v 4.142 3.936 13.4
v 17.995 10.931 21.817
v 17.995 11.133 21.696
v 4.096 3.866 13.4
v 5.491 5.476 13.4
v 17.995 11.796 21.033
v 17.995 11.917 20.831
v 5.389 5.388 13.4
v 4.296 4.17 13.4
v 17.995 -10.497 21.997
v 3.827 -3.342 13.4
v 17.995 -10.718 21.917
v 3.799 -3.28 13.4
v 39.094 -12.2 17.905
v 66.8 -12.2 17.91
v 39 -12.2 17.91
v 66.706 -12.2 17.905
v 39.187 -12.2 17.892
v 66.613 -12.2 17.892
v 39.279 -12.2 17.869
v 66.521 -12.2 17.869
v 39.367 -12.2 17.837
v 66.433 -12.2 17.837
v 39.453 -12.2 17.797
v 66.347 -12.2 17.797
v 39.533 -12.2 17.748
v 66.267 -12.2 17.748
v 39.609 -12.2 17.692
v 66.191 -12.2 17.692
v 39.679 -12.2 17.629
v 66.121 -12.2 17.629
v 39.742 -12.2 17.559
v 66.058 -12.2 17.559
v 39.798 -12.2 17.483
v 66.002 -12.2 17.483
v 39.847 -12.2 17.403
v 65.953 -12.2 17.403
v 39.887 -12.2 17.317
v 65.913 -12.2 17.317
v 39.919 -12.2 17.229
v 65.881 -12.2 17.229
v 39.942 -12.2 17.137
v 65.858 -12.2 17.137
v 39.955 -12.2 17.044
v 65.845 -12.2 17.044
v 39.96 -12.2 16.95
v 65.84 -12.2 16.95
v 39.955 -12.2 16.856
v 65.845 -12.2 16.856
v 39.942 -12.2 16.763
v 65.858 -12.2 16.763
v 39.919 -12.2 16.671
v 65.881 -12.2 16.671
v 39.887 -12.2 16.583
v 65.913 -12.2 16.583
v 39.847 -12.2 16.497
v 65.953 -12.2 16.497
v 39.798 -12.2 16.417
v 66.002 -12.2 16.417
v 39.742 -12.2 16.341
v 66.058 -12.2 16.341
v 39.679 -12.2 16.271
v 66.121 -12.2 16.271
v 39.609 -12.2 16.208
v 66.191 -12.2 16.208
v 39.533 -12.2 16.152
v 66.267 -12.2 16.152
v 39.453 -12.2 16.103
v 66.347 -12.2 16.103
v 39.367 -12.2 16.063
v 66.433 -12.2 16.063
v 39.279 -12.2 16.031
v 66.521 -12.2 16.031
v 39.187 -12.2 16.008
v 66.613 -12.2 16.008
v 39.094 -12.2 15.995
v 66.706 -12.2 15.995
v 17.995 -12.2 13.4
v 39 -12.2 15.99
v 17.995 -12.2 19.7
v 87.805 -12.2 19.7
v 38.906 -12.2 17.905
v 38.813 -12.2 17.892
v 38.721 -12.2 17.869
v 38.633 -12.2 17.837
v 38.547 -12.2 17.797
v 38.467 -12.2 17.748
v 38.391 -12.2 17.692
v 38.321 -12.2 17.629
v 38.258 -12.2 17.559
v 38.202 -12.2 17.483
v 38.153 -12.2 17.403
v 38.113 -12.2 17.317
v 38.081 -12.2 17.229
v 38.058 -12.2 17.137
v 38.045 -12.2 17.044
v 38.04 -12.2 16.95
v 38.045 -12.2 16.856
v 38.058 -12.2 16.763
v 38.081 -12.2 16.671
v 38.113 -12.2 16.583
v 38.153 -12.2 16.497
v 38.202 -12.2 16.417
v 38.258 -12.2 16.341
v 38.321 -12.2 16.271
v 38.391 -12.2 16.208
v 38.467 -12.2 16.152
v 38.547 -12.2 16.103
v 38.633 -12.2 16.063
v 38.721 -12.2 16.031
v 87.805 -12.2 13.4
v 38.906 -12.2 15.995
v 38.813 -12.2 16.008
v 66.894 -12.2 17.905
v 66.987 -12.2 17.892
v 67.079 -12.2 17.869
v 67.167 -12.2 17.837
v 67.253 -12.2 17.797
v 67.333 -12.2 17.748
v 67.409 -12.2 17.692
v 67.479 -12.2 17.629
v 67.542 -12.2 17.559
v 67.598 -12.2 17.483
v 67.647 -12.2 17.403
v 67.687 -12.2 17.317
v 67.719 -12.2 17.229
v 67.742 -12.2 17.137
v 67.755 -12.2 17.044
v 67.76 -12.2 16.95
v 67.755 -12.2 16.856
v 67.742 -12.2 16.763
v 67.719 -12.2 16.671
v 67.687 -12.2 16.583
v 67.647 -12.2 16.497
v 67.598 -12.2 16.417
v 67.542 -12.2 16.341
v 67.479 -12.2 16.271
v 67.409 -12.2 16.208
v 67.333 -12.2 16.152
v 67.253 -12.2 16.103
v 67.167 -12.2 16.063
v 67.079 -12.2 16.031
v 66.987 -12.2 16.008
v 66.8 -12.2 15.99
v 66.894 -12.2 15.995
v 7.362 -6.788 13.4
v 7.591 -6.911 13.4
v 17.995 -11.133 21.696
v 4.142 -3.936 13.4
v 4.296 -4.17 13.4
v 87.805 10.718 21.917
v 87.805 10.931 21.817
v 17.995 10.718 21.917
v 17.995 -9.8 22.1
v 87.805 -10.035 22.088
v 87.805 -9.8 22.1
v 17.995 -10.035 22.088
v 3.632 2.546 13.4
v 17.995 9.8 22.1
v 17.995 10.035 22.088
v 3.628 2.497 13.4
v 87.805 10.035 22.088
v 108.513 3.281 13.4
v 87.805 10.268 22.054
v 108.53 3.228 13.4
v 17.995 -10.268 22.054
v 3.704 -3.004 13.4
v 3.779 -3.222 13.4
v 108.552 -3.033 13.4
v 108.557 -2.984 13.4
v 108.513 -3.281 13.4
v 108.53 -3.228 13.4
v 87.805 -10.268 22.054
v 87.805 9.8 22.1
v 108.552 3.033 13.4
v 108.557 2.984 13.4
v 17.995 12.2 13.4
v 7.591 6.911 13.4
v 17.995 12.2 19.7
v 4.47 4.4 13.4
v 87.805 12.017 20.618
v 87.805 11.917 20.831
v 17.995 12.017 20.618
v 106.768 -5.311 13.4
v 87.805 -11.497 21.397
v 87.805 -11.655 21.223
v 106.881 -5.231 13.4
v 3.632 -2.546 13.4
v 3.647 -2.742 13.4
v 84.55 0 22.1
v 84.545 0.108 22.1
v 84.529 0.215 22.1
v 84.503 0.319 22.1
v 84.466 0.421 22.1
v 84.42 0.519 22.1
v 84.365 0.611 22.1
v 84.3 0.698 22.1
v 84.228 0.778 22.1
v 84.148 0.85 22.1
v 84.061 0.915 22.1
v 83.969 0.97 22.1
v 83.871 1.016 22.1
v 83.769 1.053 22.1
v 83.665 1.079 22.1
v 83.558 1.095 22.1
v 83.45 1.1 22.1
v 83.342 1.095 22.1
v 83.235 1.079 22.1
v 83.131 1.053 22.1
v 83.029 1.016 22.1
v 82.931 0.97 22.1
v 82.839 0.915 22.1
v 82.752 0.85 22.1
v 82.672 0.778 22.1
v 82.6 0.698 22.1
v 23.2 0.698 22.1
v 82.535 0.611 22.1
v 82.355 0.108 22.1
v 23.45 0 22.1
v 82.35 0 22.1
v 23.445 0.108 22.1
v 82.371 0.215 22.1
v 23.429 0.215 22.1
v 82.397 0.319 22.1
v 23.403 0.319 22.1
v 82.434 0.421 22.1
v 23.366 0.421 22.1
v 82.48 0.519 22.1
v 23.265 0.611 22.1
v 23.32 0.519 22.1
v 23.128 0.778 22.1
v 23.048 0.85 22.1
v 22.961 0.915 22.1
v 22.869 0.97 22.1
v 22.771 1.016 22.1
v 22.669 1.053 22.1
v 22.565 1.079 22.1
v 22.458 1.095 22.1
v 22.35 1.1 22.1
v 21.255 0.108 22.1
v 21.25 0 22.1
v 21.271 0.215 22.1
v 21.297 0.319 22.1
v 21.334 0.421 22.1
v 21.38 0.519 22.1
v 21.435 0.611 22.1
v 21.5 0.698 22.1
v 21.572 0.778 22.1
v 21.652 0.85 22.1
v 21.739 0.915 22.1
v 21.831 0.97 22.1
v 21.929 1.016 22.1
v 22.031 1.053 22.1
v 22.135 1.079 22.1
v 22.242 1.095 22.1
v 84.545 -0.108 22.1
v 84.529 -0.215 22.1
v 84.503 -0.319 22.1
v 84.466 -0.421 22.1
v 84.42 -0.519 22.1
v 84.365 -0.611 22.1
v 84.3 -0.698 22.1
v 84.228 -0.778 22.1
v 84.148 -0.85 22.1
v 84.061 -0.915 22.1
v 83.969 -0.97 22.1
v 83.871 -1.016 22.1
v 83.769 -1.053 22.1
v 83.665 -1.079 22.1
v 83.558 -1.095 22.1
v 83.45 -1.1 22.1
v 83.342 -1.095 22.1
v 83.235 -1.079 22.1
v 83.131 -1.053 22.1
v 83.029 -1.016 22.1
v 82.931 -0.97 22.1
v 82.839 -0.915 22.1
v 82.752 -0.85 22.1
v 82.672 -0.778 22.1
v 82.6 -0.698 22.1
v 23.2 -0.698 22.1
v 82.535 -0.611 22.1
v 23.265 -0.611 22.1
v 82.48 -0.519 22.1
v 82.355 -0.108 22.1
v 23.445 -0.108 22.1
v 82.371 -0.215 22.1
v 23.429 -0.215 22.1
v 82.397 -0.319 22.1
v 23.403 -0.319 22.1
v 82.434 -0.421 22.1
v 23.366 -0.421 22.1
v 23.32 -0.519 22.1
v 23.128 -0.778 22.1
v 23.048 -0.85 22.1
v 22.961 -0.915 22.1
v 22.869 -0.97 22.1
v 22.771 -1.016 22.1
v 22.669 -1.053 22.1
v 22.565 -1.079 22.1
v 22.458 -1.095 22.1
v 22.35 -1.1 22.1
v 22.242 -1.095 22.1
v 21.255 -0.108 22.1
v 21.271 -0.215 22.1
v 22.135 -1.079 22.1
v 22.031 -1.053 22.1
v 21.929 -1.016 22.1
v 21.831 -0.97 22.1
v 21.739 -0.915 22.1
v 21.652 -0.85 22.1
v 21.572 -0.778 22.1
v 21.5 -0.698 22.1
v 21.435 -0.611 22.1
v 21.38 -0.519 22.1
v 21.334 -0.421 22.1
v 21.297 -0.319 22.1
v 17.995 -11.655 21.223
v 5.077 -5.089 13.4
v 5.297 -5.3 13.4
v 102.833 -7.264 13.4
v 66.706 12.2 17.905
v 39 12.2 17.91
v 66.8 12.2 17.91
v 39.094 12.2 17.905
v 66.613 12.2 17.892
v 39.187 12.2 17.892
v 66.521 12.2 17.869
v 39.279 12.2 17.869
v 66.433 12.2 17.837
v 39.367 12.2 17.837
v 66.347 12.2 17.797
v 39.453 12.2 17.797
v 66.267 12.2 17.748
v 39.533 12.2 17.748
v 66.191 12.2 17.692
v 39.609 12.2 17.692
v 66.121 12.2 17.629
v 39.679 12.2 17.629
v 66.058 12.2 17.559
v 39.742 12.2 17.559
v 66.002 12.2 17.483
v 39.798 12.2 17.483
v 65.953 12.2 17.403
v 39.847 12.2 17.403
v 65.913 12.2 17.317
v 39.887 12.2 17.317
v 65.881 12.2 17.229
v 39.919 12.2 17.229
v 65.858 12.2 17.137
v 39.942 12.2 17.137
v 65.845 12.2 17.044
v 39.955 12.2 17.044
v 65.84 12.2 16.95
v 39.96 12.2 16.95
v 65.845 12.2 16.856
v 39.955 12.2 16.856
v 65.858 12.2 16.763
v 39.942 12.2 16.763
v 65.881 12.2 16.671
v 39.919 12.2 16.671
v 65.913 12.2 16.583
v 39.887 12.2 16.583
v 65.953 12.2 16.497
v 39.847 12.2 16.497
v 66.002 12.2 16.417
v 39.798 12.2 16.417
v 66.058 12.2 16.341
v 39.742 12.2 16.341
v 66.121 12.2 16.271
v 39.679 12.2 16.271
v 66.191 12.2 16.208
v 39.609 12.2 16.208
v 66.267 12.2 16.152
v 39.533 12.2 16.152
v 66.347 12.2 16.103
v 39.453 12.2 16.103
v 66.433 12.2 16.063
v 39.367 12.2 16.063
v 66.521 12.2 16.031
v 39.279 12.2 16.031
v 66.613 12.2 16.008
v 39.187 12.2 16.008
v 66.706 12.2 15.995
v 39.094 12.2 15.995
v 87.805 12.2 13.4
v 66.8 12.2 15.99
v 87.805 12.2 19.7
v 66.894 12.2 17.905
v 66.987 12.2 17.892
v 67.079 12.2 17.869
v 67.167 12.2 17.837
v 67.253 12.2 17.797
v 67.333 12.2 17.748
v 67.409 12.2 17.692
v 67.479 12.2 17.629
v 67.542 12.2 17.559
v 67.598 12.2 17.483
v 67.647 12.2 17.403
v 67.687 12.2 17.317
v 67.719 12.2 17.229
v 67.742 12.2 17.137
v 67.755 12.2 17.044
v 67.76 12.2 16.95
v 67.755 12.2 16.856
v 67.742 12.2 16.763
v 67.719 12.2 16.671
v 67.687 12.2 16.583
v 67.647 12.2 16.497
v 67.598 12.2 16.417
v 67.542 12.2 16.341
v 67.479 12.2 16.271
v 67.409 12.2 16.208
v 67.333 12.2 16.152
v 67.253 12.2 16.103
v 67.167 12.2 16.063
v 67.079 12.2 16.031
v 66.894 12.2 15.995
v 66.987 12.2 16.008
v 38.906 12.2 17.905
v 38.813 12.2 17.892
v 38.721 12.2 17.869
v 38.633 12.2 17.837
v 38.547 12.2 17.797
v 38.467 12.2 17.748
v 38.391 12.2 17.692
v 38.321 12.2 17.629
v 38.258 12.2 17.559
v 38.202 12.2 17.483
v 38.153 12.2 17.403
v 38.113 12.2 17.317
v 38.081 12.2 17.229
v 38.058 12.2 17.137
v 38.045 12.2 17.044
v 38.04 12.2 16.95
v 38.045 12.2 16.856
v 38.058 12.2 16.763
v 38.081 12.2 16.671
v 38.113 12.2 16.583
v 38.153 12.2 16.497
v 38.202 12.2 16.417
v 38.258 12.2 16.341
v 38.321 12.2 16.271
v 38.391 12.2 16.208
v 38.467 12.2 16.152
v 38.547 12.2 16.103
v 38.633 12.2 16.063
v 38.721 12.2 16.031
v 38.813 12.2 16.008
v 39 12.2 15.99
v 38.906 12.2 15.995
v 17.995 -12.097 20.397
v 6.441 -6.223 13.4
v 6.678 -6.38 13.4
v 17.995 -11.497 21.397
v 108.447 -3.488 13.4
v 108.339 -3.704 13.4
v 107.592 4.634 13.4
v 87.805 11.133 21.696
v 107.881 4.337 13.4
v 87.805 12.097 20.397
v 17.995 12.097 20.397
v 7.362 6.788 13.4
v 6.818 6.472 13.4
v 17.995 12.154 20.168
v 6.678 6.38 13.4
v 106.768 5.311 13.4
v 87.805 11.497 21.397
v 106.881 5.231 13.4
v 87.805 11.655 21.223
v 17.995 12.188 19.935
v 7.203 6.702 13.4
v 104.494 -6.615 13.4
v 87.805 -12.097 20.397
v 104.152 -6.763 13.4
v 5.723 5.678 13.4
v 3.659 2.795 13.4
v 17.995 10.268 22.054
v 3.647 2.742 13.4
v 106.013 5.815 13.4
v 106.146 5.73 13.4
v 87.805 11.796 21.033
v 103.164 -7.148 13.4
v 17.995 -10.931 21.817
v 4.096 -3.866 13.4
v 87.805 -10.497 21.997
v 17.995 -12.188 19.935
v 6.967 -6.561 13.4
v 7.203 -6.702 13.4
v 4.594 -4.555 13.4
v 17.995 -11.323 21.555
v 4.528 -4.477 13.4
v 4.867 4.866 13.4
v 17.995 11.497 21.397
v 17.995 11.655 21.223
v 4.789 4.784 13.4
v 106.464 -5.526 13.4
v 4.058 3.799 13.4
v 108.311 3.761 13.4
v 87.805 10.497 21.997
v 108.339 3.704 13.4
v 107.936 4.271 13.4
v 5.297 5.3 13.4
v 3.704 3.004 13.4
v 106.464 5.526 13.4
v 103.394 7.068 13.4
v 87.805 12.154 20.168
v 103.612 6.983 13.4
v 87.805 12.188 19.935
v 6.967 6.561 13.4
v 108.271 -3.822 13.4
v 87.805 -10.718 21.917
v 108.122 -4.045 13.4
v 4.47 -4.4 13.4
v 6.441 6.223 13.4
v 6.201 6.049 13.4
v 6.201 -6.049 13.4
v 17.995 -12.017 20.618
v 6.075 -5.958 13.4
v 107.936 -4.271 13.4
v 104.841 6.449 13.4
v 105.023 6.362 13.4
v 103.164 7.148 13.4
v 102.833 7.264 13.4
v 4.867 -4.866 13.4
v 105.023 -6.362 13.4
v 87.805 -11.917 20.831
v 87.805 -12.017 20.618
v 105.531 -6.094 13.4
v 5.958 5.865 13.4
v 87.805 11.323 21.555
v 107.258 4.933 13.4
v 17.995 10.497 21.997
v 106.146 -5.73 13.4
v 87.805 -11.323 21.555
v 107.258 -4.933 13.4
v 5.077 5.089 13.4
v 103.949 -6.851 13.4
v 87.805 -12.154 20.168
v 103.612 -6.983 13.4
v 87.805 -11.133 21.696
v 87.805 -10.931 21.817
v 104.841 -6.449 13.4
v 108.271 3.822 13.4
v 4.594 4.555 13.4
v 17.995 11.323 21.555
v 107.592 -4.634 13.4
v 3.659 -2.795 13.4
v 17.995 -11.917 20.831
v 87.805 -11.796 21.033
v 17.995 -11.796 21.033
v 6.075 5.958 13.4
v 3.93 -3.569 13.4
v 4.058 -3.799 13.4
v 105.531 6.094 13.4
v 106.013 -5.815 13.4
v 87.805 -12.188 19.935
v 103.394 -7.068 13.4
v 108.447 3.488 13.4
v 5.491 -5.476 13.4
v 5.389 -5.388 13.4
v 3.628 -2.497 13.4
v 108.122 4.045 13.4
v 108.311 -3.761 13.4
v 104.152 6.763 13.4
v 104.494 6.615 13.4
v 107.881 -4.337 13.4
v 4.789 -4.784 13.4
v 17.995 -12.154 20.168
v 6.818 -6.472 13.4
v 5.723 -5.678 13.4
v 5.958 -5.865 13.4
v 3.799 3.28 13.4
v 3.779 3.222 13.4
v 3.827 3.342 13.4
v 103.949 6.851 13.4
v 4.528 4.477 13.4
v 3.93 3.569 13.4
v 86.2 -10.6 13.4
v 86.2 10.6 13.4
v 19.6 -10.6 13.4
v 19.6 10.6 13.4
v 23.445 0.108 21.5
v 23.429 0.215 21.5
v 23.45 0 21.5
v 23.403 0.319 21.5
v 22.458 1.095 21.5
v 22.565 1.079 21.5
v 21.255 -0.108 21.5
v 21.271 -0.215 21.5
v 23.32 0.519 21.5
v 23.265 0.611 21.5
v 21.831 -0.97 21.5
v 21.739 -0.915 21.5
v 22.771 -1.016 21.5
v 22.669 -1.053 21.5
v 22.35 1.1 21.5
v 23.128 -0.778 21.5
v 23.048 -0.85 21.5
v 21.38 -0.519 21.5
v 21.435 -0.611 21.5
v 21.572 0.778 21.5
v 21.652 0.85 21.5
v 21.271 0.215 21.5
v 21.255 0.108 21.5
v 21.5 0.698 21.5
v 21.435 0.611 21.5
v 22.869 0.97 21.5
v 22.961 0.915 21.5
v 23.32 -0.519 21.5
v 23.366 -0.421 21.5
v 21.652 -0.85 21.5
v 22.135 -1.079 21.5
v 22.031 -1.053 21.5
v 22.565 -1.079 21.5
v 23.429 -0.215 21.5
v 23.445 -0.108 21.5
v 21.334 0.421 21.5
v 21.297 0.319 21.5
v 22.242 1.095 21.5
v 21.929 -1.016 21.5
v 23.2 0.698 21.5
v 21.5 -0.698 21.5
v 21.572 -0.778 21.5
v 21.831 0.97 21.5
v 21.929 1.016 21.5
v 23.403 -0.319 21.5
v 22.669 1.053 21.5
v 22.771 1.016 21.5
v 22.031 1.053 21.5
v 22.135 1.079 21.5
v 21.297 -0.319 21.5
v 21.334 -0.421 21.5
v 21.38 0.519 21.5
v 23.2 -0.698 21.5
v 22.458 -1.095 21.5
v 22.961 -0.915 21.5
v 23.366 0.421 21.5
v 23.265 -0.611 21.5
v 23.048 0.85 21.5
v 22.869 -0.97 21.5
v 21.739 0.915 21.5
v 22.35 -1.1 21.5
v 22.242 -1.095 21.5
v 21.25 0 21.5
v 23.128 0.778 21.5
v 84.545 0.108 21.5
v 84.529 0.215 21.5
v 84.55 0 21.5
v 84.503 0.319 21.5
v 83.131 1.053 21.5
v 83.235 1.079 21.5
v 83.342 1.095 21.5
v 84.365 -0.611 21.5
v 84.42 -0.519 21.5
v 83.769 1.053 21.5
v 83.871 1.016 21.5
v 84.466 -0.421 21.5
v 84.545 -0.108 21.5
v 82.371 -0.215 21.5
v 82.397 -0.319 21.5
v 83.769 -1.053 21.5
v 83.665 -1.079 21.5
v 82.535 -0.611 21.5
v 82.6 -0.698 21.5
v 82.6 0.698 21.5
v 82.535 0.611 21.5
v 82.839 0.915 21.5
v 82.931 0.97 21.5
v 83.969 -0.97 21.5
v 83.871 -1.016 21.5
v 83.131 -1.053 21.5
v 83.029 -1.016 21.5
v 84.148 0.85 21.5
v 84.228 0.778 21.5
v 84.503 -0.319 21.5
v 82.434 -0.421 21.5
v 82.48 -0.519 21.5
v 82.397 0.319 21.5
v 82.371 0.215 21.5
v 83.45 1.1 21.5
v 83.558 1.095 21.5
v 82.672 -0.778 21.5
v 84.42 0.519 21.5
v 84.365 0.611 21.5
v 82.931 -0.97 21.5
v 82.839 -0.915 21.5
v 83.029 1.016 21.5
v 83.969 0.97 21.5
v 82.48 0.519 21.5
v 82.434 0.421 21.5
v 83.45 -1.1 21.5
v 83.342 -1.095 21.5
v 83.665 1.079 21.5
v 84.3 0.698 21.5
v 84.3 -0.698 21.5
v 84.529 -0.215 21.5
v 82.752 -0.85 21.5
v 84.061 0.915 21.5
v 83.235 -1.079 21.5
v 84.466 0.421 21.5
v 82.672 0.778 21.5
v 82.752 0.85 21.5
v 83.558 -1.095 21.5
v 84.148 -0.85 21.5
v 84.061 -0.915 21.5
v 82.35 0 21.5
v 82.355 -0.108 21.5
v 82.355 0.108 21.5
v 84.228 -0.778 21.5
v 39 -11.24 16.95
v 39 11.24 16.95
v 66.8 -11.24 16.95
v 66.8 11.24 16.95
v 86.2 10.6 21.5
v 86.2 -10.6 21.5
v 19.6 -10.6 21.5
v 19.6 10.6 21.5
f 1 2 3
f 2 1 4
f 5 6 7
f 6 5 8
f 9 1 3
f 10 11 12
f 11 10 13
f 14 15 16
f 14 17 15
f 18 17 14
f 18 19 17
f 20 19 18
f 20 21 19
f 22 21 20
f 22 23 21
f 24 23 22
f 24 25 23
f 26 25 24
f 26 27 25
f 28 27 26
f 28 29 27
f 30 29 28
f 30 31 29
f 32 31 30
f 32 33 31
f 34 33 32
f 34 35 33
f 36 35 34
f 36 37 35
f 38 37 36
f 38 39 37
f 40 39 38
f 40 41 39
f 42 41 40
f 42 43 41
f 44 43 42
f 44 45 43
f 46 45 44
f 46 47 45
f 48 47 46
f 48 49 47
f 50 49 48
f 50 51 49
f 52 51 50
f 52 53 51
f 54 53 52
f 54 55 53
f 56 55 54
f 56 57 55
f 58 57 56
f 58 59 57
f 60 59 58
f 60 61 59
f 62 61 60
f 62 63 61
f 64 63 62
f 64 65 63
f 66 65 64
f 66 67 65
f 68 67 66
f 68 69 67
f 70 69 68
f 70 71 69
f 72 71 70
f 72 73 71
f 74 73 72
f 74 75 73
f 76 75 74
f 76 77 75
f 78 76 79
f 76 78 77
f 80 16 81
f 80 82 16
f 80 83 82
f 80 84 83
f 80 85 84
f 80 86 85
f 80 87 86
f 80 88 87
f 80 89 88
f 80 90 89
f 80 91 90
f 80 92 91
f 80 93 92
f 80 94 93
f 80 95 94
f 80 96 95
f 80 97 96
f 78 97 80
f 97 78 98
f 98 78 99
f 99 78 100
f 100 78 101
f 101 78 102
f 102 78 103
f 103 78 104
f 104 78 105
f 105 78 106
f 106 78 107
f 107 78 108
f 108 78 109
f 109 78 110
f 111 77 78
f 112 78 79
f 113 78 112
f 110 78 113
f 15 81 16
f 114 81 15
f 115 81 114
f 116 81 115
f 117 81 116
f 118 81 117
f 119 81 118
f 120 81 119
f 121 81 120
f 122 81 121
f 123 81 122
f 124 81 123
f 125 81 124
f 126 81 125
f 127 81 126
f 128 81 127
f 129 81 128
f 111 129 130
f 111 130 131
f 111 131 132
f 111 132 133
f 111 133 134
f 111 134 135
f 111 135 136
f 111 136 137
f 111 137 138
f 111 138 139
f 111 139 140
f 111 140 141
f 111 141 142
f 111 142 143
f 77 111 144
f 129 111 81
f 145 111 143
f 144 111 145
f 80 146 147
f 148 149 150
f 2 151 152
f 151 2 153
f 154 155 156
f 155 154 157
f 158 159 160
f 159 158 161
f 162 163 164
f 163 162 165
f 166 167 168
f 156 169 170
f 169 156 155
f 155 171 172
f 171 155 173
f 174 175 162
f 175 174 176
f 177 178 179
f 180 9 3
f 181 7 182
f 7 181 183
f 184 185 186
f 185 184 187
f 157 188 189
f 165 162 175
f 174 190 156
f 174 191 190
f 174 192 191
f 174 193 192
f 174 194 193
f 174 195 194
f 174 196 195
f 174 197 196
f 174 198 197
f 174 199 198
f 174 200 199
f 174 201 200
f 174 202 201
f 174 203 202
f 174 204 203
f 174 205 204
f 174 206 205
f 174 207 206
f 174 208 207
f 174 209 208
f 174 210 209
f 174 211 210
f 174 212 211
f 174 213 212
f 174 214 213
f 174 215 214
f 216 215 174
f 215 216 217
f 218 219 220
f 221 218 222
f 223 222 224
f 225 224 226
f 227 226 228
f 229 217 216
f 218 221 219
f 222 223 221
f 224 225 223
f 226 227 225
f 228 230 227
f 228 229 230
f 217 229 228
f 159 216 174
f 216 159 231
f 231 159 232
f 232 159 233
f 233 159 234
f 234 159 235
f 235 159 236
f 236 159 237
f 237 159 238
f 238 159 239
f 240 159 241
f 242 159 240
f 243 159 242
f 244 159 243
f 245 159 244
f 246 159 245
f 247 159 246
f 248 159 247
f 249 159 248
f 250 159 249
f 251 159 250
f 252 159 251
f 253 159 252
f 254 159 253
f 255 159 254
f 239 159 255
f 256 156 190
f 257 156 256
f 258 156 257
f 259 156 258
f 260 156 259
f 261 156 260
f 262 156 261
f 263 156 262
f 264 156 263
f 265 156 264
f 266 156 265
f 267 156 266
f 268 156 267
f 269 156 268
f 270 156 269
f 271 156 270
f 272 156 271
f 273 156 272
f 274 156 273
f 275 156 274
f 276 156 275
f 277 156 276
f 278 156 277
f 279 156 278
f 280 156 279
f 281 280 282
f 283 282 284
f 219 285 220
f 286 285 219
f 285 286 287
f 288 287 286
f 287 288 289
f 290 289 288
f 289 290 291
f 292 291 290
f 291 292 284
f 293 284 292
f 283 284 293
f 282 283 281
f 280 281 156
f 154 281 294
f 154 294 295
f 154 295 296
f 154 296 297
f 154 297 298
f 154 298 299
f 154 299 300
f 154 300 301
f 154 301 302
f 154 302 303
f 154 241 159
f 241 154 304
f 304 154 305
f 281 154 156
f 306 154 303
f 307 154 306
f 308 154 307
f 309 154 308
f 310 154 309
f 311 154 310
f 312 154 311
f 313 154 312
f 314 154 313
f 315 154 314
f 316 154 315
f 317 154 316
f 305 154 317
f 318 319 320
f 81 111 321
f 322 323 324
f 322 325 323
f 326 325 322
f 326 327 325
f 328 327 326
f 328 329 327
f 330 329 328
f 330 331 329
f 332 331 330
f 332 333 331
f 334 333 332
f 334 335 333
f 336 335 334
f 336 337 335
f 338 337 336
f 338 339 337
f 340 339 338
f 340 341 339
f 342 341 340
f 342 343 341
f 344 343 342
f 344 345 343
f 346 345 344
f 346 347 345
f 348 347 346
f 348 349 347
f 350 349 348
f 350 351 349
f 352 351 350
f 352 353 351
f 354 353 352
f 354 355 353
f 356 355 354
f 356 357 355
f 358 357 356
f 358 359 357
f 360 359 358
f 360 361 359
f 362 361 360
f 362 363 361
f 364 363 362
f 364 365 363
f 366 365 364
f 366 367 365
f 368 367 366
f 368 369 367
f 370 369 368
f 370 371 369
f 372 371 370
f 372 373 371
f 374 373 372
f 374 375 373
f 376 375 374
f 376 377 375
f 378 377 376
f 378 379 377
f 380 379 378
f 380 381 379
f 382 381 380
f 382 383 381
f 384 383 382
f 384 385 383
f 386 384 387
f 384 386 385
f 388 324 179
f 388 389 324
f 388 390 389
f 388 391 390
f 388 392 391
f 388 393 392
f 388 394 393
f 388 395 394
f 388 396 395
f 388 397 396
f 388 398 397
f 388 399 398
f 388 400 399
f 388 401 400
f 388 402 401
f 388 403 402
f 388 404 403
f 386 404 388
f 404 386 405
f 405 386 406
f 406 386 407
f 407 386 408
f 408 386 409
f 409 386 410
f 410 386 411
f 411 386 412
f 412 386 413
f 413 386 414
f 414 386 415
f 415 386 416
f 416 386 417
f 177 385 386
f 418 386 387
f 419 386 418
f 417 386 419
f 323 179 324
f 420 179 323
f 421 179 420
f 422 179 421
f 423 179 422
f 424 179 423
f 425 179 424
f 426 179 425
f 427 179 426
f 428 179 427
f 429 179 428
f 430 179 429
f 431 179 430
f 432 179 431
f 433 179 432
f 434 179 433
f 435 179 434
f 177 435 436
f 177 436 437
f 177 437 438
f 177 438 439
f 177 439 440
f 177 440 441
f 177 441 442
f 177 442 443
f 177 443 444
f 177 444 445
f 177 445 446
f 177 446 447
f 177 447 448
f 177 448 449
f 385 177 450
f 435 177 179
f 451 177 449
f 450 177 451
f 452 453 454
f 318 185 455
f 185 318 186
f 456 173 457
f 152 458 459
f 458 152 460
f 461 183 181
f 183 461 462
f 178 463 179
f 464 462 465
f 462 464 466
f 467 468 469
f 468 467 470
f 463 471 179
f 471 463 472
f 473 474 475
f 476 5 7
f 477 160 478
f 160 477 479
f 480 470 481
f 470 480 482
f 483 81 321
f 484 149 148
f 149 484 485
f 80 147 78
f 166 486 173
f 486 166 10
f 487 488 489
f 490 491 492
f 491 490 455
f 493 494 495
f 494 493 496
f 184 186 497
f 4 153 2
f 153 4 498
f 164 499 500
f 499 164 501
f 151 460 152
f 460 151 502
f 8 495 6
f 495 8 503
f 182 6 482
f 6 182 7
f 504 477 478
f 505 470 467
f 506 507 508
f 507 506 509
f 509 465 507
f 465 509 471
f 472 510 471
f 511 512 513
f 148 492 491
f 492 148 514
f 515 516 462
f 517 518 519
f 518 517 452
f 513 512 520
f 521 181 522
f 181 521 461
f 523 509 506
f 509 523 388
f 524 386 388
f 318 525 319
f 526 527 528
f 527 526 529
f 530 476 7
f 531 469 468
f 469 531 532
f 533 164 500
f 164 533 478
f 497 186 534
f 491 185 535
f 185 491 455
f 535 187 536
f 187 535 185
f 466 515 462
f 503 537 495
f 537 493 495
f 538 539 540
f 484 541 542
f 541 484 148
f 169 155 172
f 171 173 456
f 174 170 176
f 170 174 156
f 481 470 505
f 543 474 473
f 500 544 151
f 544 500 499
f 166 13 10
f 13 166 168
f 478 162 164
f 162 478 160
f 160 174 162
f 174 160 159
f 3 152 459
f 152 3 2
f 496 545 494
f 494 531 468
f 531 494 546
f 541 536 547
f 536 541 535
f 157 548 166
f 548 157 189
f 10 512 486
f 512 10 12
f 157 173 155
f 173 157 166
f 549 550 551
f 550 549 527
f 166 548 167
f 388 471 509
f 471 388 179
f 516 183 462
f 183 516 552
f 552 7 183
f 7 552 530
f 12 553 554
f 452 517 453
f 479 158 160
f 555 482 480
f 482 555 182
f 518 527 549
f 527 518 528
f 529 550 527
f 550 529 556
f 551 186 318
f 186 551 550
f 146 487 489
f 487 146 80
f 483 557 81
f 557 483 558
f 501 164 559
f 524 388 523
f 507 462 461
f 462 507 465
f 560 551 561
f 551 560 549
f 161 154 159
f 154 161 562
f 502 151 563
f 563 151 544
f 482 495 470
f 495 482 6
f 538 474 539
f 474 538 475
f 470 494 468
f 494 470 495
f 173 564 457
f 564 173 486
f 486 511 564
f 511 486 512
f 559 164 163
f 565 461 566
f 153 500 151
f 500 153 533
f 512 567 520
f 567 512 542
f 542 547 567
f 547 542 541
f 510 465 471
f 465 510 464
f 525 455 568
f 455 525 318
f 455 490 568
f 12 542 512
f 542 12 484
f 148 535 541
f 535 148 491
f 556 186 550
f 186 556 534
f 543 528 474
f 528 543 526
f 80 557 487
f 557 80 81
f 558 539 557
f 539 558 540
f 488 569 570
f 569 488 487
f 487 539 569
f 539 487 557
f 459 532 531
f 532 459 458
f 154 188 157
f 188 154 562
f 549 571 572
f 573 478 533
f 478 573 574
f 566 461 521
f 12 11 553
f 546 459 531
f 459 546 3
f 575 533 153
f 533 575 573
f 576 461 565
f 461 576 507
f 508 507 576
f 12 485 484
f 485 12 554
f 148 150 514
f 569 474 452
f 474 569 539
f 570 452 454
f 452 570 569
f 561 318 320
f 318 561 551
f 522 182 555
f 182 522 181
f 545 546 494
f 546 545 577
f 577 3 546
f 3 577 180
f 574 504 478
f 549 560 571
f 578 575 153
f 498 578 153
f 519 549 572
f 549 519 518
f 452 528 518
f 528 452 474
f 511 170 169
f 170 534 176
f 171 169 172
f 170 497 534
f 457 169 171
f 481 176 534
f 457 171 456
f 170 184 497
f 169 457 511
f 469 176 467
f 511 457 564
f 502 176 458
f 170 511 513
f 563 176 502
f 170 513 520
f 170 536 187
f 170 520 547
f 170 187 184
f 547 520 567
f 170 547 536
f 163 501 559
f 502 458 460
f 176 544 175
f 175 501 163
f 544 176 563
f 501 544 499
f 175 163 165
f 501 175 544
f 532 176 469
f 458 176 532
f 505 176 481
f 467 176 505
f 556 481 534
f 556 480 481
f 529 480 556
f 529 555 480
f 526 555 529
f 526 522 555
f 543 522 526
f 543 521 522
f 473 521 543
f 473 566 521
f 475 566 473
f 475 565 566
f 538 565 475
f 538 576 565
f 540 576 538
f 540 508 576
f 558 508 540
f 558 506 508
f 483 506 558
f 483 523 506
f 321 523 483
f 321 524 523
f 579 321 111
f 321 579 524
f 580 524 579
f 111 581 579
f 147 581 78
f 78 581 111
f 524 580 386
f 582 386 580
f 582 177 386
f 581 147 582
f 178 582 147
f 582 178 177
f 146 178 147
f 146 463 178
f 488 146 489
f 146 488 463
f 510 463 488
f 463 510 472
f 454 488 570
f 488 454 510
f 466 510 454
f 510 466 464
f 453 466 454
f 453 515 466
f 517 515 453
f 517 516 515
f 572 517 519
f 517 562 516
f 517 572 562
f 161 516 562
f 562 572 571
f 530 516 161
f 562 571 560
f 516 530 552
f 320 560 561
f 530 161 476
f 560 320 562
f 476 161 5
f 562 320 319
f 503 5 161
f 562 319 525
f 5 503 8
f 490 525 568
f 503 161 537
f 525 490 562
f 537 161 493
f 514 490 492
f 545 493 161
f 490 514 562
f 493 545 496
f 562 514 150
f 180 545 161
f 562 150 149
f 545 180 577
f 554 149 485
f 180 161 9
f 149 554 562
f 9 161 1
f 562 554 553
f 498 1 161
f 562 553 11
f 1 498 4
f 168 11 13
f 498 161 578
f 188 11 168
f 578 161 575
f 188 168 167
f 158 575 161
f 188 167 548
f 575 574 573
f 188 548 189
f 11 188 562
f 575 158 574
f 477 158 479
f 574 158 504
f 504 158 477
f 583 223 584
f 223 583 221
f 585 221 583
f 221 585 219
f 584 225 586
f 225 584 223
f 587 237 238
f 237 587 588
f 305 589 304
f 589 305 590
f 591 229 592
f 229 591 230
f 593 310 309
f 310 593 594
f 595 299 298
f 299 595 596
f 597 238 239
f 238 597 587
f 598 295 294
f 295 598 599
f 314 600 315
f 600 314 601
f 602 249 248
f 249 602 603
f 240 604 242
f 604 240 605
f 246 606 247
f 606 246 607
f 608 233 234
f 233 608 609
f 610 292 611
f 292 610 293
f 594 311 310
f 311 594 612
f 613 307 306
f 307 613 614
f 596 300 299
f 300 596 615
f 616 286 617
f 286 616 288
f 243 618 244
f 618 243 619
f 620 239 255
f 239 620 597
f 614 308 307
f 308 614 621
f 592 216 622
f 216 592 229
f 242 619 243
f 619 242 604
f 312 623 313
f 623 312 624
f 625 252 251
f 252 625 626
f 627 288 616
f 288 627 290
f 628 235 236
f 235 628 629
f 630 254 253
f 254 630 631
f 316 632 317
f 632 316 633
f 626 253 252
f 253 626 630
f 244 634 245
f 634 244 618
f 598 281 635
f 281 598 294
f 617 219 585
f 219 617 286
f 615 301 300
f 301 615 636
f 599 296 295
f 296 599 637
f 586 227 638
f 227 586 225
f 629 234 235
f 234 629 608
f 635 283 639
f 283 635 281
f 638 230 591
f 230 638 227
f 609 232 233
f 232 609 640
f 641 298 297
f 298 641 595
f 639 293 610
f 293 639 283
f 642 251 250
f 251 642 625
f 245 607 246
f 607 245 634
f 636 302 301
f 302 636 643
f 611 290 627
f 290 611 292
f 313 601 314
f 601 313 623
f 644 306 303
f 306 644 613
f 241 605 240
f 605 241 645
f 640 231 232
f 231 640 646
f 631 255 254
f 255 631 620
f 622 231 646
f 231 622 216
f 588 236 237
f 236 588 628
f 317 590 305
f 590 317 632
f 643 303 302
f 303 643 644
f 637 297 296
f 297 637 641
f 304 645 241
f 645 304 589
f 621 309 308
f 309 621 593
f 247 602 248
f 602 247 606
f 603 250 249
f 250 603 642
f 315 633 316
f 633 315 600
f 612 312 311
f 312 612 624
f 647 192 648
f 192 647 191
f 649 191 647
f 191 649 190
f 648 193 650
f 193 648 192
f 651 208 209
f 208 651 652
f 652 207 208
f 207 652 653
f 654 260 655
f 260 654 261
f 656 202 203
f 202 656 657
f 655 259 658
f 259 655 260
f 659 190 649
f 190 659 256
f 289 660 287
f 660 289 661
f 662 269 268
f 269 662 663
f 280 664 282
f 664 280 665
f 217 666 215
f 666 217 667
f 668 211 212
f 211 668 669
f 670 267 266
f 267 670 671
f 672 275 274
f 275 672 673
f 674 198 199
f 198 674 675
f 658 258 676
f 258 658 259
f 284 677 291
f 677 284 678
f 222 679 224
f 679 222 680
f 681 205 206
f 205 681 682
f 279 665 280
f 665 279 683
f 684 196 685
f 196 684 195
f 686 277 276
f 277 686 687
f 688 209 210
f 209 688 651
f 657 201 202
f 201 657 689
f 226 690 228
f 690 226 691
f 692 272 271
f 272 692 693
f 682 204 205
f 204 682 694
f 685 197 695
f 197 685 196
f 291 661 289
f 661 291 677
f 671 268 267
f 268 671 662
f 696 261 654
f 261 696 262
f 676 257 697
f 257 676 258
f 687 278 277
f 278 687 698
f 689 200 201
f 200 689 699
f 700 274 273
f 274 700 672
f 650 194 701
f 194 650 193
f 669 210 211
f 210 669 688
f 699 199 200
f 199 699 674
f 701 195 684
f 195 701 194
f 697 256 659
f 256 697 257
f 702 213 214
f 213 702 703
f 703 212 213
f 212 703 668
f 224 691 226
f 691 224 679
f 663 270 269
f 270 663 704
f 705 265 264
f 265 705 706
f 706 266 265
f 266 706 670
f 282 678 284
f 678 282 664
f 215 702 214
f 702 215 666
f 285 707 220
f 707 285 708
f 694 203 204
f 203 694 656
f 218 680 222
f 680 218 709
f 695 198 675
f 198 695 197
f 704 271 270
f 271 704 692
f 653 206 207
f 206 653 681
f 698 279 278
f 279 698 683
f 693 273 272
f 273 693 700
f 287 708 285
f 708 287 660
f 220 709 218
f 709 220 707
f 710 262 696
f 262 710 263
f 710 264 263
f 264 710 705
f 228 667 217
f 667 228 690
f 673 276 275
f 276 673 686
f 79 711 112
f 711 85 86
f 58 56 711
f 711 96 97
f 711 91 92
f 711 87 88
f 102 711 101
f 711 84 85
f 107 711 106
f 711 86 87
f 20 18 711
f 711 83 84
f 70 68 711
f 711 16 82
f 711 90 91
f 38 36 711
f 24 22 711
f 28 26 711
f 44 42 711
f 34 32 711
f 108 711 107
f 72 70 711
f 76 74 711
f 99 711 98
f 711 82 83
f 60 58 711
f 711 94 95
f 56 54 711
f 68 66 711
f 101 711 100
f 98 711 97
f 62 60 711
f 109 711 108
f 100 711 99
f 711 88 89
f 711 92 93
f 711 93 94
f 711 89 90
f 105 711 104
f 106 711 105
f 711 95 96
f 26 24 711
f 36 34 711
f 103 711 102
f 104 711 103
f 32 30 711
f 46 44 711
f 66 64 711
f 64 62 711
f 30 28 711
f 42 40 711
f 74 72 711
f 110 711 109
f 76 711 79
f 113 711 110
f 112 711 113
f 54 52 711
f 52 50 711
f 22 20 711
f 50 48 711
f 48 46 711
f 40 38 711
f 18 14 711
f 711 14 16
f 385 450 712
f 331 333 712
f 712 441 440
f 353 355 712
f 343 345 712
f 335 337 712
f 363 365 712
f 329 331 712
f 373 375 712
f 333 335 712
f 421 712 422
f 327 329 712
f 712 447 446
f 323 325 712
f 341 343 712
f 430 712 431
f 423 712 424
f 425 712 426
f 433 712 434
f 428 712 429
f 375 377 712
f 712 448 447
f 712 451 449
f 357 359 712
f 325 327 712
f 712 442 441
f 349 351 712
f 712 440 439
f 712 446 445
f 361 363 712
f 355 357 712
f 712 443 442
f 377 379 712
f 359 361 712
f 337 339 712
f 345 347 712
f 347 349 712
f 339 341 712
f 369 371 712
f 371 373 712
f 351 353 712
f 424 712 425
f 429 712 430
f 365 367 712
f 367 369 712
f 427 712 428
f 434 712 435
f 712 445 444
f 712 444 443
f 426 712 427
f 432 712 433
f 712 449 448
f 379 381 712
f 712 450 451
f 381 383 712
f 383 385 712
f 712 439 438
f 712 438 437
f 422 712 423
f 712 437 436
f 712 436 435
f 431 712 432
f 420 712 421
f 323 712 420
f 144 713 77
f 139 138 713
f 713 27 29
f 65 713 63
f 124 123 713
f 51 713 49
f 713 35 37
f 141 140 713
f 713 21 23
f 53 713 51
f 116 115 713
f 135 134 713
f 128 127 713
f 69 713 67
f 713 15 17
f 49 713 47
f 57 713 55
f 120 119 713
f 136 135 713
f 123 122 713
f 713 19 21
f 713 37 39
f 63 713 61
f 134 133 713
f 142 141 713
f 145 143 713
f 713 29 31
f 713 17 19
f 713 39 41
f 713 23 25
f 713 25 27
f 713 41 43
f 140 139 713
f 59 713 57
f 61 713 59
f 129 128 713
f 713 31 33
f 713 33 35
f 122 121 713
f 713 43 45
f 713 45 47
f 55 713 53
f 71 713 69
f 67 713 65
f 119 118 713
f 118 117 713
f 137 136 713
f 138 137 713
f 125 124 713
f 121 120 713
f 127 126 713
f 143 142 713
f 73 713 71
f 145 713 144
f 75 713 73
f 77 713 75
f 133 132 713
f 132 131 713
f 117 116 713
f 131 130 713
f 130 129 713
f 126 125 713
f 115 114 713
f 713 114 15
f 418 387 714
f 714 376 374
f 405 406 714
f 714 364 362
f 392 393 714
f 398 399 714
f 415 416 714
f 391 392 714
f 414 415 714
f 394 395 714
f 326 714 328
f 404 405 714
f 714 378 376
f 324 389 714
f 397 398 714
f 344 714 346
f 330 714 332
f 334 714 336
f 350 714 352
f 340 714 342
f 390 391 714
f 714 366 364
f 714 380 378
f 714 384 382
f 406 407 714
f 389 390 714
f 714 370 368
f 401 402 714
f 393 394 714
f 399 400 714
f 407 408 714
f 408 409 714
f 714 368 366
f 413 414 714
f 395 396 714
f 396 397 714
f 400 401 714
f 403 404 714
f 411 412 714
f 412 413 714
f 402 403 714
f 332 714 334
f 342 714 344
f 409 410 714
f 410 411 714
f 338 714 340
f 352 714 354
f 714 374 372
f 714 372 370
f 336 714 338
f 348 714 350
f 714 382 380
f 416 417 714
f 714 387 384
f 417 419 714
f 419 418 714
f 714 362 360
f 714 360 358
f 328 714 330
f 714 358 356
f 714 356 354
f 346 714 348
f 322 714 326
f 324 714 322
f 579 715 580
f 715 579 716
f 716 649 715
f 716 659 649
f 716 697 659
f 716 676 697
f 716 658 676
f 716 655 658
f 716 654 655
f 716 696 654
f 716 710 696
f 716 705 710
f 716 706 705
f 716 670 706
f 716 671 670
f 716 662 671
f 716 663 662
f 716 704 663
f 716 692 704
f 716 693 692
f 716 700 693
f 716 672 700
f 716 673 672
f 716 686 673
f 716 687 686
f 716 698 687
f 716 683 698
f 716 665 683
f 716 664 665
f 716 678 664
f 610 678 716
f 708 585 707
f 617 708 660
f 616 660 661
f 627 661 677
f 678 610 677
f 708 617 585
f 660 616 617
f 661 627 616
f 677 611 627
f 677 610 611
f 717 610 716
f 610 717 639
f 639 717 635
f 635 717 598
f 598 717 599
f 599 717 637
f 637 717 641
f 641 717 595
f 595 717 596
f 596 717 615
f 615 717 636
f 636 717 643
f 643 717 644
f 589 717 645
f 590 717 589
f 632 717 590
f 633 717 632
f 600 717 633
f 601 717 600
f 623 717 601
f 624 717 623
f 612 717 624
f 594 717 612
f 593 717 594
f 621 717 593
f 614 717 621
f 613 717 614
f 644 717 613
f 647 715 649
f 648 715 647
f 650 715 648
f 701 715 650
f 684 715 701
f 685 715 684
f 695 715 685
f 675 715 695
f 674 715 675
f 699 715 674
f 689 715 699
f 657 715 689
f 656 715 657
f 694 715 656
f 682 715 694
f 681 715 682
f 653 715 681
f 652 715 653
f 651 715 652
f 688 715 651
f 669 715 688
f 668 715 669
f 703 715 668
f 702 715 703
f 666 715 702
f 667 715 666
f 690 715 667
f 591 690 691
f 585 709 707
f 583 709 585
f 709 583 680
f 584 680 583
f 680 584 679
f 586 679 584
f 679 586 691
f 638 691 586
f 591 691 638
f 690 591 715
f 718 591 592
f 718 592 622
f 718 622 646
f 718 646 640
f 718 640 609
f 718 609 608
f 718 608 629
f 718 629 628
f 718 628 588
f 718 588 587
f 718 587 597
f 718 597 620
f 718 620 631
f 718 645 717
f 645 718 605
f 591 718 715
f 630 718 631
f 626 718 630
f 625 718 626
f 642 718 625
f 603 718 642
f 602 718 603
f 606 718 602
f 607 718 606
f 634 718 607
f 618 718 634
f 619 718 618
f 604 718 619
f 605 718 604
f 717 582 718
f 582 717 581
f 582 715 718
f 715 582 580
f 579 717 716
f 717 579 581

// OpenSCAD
// file: common.scad
// Shapes both printed parts share.
//
// Everything here is driven by params.scad, which is generated from
// data/mechanical.yaml. No dimension is written in this file, on purpose: a
// number typed into geometry is a number the site cannot see and a reviewer
// cannot check the provenance of.

include <params.scad>

$fn = 64;

// The board and the cell, as solids to subtract. Rendered on their own by
// fit.scad so you can see what the cavity is holding.
module board_envelope(clearance = 0) {
    c = clearance;
    translate([-c, -board_width / 2 - c, -c])
        cube([board_length + 2 * c, board_width + 2 * c, board_thickness + 2 * c]);
}

module board_components(clearance = 0) {
    c = clearance;
    // Component keepout above and below, inset from the edge so the envelope
    // stays the thing that sets the fit.
    translate([-c, -board_width / 2 - c, board_thickness])
        cube([board_length + 2 * c, board_width + 2 * c, comp_height_top + c]);
    translate([-c, -board_width / 2 - c, -comp_height_bottom - c])
        cube([board_length + 2 * c, board_width + 2 * c, comp_height_bottom + c]);
}

module cell_envelope(clearance = 0) {
    c = clearance + cell_squeeze;
    translate([-c, -(cell_width + 2 * c) / 2, -c])
        cube([cell_length + 2 * c, cell_width + 2 * c, cell_thickness + 2 * c]);
}

// The four board mounting holes, as posts or as holes depending on what is
// wrapped around them.
module mount_points(d, h) {
    for (x = [mount_hole_inset, board_length - mount_hole_inset])
        for (y = [-board_width / 2 + mount_hole_inset, board_width / 2 - mount_hole_inset])
            translate([x, y, 0]) cylinder(d = d, h = h);
}

// A rounded slab used as a station in a hull. Hulling several of these along X
// gives a smooth streamlined body without a surface of revolution, which is
// what a pod wants: it has to be wide and flat, not round.
module station(x, w, h, r) {
    translate([x, 0, 0])
        hull()
            for (sy = [-1, 1])
                for (sz = [0, 1])
                    translate([0, sy * (w / 2 - r), sz * (h - 2 * r) + r])
                        rotate([0, 90, 0])
                            cylinder(r = r, h = 0.01, center = true);
}

// The static port pilot marks.
//
// Shallow cones, not holes. The Mounting page will not publish a port diameter
// until it has been derived from the enclosed volume and confirmed by flying
// two configurations, and a model that shipped a default would make that
// refusal false in the one place a builder acts on it. So the pod tells you
// where to drill, which is known, and not how big, which is not.
//
// Set port_dia on the command line to bore them for real:
//   openscad -D port_dia=3 -o pod.stl pod.scad
module port_mark(depth) {
    if (port_dia == undef) {
        // Cone rather than cylinder: a drill bit centres itself in a cone, and
        // a mark you cannot start a bit in is decoration.
        rotate([0, 90, 0]) cylinder(r1 = depth, r2 = 0, h = depth);
    } else {
        assert(port_dia > 0, "port_dia must be positive");
        rotate([0, 90, 0]) cylinder(d = port_dia, h = depth * 4, center = true);
    }
}
// file: pod-shape.scad
// Form B: the external pod. Geometry shared by the base and the cap.
//
// The pod straps to the outside of a body tube and comes off again. Nothing is
// drilled, cut or glued to a rocket you care about, which is the argument for
// it: it is the form factor that fits a rocket you already own. What it costs
// is on the Mounting page and is not hidden. A pod adds drag, adds asymmetric
// drag, and moves both the centre of gravity and the centre of pressure.
// Re-simulate before you fly it.
//
// WHY IT IS TWO PARTS
//
// A single-piece pod has a cavity that opens somewhere, and every choice of
// where is bad. Opening upward leaves the payload uncovered. Opening downward
// onto the tube leaves nothing to hold the board. And neither prints: the pod
// is convex on top and concave underneath, so no orientation puts a flat face
// on the bed.
//
// Split at the top of the cell, both halves have one large flat face, both
// print that face down with no supports, and the saddle ends up facing upward
// where a concave surface is free rather than an overhang.

include <common.scad>

// --- the cell and the cavity it sits in --------------------------------------

cell_l = cell_length + 2 * cell_squeeze;
cell_w = cell_width + 2 * cell_squeeze;
cell_h = cell_thickness + 2 * cell_squeeze;

// Long enough for the board plus a boss pad at each end, wide enough for
// whichever of the board and the cell is wider.
cavity_l = board_length + 2 * fit_clearance + 2 * pod_boss_pad;
cavity_w = max(board_width + 2 * fit_clearance, cell_w);
cavity_h = cell_h + pod_cavity_gap + comp_height_bottom + board_thickness + comp_height_top;

// --- stacking up from the tube -----------------------------------------------

saddle_r = (tube_od + fit_clearance) / 2;
// The tube axis sits below the pod so the tube intrudes pod_saddle_depth into
// the underside. Everything else is stacked from there.
saddle_z = -(saddle_r - pod_saddle_depth);

cavity_z = pod_saddle_depth + floor_thickness;
// The joint: the top of the cell. Below it the base carries the cell and takes
// the straps; above it the cap covers the board.
split_z = cavity_z + cell_h + pod_cavity_gap;

pod_l = pod_nose_len + cavity_l + 2 * pod_wall + pod_tail_len;
pod_w = cavity_w + 2 * pod_wall;
pod_h = cavity_z + cavity_h + pod_wall;

body_x0 = pod_nose_len;
body_x1 = pod_l - pod_tail_len;
cav_x0 = body_x0 + pod_wall;

// The tips do not taper to nothing in height, only in width. A tip shallow
// enough to be elegant is a tip the saddle and the strap slot between them cut
// clean through, which leaves the nose as a separate loose object.
tip_h = pod_saddle_depth + strap_slot_height + 3 * pod_wall;
corner_r = min(pod_wall * 1.5, pod_w * 0.25 / 2, tip_h / 2);

slot_z = pod_saddle_depth + pod_wall;
slot_x = [pod_nose_len * 0.6, pod_l - pod_tail_len * 0.6];

boss_x = [cav_x0 + pod_boss_pad / 2, cav_x0 + cavity_l - pod_boss_pad / 2];
boss_d = mount_hole_dia + 2.4;

assert(tip_h < pod_h, "tip_h must be shorter than the pod is tall");
assert(split_z < cavity_z + cavity_h, "the split must fall inside the cavity");

// --- shapes ------------------------------------------------------------------

module pod_outer() {
    hull() {
        // Small but not zero. A hull to a knife edge prints as a ragged single
        // extrusion that snaps off in a field.
        station(0, pod_w * 0.25, tip_h, corner_r);
        station(body_x0, pod_w, pod_h, corner_r);
        station(body_x1, pod_w, pod_h, corner_r);
        station(pod_l, pod_w * 0.3, tip_h, corner_r);
    }
}

module saddle() {
    translate([-1, 0, saddle_z])
        rotate([0, 90, 0])
            cylinder(r = saddle_r, h = pod_l + 2);
}

// Full height, then clipped by whichever half is being built.
module cavity() {
    translate([cav_x0, -cavity_w / 2, cavity_z]) cube([cavity_l, cavity_w, cavity_h + 1]);
}

// Two slots, fore and aft, so the pod is held at both ends and cannot pivot
// about a single strap. They pass through the solid tips, clear of the cavity,
// and sit just above the saddle so the strap wraps the tube closely.
module strap_slots() {
    for (x = slot_x)
        translate([x - strap_slot_width / 2, -pod_w, slot_z])
            cube([strap_slot_width, pod_w * 2, strap_slot_height]);
}

module bosses() {
    for (x = boss_x) translate([x, 0, cavity_z]) cylinder(d = boss_d, h = split_z - cavity_z);
}

module boss_pilots() {
    // Undersized so an M2 cuts its own thread in the plastic. No insert needed.
    for (x = boss_x)
        translate([x, 0, cavity_z - 1]) cylinder(d = mount_hole_dia - 0.5, h = pod_h);
}

module cap_screw_holes() {
    for (x = boss_x) translate([x, 0, split_z - 1]) cylinder(d = mount_hole_dia, h = pod_h);
}

// A spigot: the base wall continues up inside the cap so the halves locate on
// each other rather than on the screws. Screws through an unaligned joint bend
// the cap instead of closing it.
module lip() {
    t = pod_wall * 0.6;
    // Centred on the cavity, not on the origin. The cavity starts at cav_x0.
    translate([cav_x0 + cavity_l / 2, 0, split_z])
        linear_extrude(pod_lip_height)
            difference() {
                square([cavity_l - fit_clearance, cavity_w - fit_clearance], center = true);
                square([cavity_l - fit_clearance - 2 * t, cavity_w - fit_clearance - 2 * t],
                       center = true);
            }
}

// Ports on both side walls of the cap, level with the board. Symmetric left to
// right so yaw averages out, which is the rule the Mounting page states. They
// are dimples, not holes: see port_mark in common.scad for why.
module port_marks() {
    depth = pod_wall * 0.6;
    per_side = max(1, floor(port_count / 2));
    span = (board_length + 2 * fit_clearance) * 0.5;
    x0 = cav_x0 + cavity_l / 2 - span / 2;
    step = per_side > 1 ? span / (per_side - 1) : 0;
    z = (split_z + cavity_z + cavity_h) / 2;

    for (i = [0 : per_side - 1])
        for (s = [-1, 1])
            translate([x0 + i * step, s * pod_w / 2, z])
                rotate([0, 0, s > 0 ? -90 : 90])
                    port_mark(depth);
}

module below_split() {
    translate([-1, -pod_w, -pod_h]) cube([pod_l + 2, pod_w * 2, pod_h + split_z]);
}

module above_split() {
    translate([-1, -pod_w, split_z]) cube([pod_l + 2, pod_w * 2, pod_h]);
}
// main file
// Form B, upper half: covers the board and carries the static port marks.
//
//   openscad -o oapogee-pod-cap.stl pod-cap.scad
//   openscad -D port_dia=3 -o cap-drilled.stl pod-cap.scad   ports bored, not marked
//
// Print the flat split face down, no supports. The aerodynamic surface then
// faces up and is never a bridge.

include <pod-shape.scad>

difference() {
    intersection() {
        pod_outer();
        above_split();
    }
    cavity();
    cap_screw_holes();
    port_marks();
}
